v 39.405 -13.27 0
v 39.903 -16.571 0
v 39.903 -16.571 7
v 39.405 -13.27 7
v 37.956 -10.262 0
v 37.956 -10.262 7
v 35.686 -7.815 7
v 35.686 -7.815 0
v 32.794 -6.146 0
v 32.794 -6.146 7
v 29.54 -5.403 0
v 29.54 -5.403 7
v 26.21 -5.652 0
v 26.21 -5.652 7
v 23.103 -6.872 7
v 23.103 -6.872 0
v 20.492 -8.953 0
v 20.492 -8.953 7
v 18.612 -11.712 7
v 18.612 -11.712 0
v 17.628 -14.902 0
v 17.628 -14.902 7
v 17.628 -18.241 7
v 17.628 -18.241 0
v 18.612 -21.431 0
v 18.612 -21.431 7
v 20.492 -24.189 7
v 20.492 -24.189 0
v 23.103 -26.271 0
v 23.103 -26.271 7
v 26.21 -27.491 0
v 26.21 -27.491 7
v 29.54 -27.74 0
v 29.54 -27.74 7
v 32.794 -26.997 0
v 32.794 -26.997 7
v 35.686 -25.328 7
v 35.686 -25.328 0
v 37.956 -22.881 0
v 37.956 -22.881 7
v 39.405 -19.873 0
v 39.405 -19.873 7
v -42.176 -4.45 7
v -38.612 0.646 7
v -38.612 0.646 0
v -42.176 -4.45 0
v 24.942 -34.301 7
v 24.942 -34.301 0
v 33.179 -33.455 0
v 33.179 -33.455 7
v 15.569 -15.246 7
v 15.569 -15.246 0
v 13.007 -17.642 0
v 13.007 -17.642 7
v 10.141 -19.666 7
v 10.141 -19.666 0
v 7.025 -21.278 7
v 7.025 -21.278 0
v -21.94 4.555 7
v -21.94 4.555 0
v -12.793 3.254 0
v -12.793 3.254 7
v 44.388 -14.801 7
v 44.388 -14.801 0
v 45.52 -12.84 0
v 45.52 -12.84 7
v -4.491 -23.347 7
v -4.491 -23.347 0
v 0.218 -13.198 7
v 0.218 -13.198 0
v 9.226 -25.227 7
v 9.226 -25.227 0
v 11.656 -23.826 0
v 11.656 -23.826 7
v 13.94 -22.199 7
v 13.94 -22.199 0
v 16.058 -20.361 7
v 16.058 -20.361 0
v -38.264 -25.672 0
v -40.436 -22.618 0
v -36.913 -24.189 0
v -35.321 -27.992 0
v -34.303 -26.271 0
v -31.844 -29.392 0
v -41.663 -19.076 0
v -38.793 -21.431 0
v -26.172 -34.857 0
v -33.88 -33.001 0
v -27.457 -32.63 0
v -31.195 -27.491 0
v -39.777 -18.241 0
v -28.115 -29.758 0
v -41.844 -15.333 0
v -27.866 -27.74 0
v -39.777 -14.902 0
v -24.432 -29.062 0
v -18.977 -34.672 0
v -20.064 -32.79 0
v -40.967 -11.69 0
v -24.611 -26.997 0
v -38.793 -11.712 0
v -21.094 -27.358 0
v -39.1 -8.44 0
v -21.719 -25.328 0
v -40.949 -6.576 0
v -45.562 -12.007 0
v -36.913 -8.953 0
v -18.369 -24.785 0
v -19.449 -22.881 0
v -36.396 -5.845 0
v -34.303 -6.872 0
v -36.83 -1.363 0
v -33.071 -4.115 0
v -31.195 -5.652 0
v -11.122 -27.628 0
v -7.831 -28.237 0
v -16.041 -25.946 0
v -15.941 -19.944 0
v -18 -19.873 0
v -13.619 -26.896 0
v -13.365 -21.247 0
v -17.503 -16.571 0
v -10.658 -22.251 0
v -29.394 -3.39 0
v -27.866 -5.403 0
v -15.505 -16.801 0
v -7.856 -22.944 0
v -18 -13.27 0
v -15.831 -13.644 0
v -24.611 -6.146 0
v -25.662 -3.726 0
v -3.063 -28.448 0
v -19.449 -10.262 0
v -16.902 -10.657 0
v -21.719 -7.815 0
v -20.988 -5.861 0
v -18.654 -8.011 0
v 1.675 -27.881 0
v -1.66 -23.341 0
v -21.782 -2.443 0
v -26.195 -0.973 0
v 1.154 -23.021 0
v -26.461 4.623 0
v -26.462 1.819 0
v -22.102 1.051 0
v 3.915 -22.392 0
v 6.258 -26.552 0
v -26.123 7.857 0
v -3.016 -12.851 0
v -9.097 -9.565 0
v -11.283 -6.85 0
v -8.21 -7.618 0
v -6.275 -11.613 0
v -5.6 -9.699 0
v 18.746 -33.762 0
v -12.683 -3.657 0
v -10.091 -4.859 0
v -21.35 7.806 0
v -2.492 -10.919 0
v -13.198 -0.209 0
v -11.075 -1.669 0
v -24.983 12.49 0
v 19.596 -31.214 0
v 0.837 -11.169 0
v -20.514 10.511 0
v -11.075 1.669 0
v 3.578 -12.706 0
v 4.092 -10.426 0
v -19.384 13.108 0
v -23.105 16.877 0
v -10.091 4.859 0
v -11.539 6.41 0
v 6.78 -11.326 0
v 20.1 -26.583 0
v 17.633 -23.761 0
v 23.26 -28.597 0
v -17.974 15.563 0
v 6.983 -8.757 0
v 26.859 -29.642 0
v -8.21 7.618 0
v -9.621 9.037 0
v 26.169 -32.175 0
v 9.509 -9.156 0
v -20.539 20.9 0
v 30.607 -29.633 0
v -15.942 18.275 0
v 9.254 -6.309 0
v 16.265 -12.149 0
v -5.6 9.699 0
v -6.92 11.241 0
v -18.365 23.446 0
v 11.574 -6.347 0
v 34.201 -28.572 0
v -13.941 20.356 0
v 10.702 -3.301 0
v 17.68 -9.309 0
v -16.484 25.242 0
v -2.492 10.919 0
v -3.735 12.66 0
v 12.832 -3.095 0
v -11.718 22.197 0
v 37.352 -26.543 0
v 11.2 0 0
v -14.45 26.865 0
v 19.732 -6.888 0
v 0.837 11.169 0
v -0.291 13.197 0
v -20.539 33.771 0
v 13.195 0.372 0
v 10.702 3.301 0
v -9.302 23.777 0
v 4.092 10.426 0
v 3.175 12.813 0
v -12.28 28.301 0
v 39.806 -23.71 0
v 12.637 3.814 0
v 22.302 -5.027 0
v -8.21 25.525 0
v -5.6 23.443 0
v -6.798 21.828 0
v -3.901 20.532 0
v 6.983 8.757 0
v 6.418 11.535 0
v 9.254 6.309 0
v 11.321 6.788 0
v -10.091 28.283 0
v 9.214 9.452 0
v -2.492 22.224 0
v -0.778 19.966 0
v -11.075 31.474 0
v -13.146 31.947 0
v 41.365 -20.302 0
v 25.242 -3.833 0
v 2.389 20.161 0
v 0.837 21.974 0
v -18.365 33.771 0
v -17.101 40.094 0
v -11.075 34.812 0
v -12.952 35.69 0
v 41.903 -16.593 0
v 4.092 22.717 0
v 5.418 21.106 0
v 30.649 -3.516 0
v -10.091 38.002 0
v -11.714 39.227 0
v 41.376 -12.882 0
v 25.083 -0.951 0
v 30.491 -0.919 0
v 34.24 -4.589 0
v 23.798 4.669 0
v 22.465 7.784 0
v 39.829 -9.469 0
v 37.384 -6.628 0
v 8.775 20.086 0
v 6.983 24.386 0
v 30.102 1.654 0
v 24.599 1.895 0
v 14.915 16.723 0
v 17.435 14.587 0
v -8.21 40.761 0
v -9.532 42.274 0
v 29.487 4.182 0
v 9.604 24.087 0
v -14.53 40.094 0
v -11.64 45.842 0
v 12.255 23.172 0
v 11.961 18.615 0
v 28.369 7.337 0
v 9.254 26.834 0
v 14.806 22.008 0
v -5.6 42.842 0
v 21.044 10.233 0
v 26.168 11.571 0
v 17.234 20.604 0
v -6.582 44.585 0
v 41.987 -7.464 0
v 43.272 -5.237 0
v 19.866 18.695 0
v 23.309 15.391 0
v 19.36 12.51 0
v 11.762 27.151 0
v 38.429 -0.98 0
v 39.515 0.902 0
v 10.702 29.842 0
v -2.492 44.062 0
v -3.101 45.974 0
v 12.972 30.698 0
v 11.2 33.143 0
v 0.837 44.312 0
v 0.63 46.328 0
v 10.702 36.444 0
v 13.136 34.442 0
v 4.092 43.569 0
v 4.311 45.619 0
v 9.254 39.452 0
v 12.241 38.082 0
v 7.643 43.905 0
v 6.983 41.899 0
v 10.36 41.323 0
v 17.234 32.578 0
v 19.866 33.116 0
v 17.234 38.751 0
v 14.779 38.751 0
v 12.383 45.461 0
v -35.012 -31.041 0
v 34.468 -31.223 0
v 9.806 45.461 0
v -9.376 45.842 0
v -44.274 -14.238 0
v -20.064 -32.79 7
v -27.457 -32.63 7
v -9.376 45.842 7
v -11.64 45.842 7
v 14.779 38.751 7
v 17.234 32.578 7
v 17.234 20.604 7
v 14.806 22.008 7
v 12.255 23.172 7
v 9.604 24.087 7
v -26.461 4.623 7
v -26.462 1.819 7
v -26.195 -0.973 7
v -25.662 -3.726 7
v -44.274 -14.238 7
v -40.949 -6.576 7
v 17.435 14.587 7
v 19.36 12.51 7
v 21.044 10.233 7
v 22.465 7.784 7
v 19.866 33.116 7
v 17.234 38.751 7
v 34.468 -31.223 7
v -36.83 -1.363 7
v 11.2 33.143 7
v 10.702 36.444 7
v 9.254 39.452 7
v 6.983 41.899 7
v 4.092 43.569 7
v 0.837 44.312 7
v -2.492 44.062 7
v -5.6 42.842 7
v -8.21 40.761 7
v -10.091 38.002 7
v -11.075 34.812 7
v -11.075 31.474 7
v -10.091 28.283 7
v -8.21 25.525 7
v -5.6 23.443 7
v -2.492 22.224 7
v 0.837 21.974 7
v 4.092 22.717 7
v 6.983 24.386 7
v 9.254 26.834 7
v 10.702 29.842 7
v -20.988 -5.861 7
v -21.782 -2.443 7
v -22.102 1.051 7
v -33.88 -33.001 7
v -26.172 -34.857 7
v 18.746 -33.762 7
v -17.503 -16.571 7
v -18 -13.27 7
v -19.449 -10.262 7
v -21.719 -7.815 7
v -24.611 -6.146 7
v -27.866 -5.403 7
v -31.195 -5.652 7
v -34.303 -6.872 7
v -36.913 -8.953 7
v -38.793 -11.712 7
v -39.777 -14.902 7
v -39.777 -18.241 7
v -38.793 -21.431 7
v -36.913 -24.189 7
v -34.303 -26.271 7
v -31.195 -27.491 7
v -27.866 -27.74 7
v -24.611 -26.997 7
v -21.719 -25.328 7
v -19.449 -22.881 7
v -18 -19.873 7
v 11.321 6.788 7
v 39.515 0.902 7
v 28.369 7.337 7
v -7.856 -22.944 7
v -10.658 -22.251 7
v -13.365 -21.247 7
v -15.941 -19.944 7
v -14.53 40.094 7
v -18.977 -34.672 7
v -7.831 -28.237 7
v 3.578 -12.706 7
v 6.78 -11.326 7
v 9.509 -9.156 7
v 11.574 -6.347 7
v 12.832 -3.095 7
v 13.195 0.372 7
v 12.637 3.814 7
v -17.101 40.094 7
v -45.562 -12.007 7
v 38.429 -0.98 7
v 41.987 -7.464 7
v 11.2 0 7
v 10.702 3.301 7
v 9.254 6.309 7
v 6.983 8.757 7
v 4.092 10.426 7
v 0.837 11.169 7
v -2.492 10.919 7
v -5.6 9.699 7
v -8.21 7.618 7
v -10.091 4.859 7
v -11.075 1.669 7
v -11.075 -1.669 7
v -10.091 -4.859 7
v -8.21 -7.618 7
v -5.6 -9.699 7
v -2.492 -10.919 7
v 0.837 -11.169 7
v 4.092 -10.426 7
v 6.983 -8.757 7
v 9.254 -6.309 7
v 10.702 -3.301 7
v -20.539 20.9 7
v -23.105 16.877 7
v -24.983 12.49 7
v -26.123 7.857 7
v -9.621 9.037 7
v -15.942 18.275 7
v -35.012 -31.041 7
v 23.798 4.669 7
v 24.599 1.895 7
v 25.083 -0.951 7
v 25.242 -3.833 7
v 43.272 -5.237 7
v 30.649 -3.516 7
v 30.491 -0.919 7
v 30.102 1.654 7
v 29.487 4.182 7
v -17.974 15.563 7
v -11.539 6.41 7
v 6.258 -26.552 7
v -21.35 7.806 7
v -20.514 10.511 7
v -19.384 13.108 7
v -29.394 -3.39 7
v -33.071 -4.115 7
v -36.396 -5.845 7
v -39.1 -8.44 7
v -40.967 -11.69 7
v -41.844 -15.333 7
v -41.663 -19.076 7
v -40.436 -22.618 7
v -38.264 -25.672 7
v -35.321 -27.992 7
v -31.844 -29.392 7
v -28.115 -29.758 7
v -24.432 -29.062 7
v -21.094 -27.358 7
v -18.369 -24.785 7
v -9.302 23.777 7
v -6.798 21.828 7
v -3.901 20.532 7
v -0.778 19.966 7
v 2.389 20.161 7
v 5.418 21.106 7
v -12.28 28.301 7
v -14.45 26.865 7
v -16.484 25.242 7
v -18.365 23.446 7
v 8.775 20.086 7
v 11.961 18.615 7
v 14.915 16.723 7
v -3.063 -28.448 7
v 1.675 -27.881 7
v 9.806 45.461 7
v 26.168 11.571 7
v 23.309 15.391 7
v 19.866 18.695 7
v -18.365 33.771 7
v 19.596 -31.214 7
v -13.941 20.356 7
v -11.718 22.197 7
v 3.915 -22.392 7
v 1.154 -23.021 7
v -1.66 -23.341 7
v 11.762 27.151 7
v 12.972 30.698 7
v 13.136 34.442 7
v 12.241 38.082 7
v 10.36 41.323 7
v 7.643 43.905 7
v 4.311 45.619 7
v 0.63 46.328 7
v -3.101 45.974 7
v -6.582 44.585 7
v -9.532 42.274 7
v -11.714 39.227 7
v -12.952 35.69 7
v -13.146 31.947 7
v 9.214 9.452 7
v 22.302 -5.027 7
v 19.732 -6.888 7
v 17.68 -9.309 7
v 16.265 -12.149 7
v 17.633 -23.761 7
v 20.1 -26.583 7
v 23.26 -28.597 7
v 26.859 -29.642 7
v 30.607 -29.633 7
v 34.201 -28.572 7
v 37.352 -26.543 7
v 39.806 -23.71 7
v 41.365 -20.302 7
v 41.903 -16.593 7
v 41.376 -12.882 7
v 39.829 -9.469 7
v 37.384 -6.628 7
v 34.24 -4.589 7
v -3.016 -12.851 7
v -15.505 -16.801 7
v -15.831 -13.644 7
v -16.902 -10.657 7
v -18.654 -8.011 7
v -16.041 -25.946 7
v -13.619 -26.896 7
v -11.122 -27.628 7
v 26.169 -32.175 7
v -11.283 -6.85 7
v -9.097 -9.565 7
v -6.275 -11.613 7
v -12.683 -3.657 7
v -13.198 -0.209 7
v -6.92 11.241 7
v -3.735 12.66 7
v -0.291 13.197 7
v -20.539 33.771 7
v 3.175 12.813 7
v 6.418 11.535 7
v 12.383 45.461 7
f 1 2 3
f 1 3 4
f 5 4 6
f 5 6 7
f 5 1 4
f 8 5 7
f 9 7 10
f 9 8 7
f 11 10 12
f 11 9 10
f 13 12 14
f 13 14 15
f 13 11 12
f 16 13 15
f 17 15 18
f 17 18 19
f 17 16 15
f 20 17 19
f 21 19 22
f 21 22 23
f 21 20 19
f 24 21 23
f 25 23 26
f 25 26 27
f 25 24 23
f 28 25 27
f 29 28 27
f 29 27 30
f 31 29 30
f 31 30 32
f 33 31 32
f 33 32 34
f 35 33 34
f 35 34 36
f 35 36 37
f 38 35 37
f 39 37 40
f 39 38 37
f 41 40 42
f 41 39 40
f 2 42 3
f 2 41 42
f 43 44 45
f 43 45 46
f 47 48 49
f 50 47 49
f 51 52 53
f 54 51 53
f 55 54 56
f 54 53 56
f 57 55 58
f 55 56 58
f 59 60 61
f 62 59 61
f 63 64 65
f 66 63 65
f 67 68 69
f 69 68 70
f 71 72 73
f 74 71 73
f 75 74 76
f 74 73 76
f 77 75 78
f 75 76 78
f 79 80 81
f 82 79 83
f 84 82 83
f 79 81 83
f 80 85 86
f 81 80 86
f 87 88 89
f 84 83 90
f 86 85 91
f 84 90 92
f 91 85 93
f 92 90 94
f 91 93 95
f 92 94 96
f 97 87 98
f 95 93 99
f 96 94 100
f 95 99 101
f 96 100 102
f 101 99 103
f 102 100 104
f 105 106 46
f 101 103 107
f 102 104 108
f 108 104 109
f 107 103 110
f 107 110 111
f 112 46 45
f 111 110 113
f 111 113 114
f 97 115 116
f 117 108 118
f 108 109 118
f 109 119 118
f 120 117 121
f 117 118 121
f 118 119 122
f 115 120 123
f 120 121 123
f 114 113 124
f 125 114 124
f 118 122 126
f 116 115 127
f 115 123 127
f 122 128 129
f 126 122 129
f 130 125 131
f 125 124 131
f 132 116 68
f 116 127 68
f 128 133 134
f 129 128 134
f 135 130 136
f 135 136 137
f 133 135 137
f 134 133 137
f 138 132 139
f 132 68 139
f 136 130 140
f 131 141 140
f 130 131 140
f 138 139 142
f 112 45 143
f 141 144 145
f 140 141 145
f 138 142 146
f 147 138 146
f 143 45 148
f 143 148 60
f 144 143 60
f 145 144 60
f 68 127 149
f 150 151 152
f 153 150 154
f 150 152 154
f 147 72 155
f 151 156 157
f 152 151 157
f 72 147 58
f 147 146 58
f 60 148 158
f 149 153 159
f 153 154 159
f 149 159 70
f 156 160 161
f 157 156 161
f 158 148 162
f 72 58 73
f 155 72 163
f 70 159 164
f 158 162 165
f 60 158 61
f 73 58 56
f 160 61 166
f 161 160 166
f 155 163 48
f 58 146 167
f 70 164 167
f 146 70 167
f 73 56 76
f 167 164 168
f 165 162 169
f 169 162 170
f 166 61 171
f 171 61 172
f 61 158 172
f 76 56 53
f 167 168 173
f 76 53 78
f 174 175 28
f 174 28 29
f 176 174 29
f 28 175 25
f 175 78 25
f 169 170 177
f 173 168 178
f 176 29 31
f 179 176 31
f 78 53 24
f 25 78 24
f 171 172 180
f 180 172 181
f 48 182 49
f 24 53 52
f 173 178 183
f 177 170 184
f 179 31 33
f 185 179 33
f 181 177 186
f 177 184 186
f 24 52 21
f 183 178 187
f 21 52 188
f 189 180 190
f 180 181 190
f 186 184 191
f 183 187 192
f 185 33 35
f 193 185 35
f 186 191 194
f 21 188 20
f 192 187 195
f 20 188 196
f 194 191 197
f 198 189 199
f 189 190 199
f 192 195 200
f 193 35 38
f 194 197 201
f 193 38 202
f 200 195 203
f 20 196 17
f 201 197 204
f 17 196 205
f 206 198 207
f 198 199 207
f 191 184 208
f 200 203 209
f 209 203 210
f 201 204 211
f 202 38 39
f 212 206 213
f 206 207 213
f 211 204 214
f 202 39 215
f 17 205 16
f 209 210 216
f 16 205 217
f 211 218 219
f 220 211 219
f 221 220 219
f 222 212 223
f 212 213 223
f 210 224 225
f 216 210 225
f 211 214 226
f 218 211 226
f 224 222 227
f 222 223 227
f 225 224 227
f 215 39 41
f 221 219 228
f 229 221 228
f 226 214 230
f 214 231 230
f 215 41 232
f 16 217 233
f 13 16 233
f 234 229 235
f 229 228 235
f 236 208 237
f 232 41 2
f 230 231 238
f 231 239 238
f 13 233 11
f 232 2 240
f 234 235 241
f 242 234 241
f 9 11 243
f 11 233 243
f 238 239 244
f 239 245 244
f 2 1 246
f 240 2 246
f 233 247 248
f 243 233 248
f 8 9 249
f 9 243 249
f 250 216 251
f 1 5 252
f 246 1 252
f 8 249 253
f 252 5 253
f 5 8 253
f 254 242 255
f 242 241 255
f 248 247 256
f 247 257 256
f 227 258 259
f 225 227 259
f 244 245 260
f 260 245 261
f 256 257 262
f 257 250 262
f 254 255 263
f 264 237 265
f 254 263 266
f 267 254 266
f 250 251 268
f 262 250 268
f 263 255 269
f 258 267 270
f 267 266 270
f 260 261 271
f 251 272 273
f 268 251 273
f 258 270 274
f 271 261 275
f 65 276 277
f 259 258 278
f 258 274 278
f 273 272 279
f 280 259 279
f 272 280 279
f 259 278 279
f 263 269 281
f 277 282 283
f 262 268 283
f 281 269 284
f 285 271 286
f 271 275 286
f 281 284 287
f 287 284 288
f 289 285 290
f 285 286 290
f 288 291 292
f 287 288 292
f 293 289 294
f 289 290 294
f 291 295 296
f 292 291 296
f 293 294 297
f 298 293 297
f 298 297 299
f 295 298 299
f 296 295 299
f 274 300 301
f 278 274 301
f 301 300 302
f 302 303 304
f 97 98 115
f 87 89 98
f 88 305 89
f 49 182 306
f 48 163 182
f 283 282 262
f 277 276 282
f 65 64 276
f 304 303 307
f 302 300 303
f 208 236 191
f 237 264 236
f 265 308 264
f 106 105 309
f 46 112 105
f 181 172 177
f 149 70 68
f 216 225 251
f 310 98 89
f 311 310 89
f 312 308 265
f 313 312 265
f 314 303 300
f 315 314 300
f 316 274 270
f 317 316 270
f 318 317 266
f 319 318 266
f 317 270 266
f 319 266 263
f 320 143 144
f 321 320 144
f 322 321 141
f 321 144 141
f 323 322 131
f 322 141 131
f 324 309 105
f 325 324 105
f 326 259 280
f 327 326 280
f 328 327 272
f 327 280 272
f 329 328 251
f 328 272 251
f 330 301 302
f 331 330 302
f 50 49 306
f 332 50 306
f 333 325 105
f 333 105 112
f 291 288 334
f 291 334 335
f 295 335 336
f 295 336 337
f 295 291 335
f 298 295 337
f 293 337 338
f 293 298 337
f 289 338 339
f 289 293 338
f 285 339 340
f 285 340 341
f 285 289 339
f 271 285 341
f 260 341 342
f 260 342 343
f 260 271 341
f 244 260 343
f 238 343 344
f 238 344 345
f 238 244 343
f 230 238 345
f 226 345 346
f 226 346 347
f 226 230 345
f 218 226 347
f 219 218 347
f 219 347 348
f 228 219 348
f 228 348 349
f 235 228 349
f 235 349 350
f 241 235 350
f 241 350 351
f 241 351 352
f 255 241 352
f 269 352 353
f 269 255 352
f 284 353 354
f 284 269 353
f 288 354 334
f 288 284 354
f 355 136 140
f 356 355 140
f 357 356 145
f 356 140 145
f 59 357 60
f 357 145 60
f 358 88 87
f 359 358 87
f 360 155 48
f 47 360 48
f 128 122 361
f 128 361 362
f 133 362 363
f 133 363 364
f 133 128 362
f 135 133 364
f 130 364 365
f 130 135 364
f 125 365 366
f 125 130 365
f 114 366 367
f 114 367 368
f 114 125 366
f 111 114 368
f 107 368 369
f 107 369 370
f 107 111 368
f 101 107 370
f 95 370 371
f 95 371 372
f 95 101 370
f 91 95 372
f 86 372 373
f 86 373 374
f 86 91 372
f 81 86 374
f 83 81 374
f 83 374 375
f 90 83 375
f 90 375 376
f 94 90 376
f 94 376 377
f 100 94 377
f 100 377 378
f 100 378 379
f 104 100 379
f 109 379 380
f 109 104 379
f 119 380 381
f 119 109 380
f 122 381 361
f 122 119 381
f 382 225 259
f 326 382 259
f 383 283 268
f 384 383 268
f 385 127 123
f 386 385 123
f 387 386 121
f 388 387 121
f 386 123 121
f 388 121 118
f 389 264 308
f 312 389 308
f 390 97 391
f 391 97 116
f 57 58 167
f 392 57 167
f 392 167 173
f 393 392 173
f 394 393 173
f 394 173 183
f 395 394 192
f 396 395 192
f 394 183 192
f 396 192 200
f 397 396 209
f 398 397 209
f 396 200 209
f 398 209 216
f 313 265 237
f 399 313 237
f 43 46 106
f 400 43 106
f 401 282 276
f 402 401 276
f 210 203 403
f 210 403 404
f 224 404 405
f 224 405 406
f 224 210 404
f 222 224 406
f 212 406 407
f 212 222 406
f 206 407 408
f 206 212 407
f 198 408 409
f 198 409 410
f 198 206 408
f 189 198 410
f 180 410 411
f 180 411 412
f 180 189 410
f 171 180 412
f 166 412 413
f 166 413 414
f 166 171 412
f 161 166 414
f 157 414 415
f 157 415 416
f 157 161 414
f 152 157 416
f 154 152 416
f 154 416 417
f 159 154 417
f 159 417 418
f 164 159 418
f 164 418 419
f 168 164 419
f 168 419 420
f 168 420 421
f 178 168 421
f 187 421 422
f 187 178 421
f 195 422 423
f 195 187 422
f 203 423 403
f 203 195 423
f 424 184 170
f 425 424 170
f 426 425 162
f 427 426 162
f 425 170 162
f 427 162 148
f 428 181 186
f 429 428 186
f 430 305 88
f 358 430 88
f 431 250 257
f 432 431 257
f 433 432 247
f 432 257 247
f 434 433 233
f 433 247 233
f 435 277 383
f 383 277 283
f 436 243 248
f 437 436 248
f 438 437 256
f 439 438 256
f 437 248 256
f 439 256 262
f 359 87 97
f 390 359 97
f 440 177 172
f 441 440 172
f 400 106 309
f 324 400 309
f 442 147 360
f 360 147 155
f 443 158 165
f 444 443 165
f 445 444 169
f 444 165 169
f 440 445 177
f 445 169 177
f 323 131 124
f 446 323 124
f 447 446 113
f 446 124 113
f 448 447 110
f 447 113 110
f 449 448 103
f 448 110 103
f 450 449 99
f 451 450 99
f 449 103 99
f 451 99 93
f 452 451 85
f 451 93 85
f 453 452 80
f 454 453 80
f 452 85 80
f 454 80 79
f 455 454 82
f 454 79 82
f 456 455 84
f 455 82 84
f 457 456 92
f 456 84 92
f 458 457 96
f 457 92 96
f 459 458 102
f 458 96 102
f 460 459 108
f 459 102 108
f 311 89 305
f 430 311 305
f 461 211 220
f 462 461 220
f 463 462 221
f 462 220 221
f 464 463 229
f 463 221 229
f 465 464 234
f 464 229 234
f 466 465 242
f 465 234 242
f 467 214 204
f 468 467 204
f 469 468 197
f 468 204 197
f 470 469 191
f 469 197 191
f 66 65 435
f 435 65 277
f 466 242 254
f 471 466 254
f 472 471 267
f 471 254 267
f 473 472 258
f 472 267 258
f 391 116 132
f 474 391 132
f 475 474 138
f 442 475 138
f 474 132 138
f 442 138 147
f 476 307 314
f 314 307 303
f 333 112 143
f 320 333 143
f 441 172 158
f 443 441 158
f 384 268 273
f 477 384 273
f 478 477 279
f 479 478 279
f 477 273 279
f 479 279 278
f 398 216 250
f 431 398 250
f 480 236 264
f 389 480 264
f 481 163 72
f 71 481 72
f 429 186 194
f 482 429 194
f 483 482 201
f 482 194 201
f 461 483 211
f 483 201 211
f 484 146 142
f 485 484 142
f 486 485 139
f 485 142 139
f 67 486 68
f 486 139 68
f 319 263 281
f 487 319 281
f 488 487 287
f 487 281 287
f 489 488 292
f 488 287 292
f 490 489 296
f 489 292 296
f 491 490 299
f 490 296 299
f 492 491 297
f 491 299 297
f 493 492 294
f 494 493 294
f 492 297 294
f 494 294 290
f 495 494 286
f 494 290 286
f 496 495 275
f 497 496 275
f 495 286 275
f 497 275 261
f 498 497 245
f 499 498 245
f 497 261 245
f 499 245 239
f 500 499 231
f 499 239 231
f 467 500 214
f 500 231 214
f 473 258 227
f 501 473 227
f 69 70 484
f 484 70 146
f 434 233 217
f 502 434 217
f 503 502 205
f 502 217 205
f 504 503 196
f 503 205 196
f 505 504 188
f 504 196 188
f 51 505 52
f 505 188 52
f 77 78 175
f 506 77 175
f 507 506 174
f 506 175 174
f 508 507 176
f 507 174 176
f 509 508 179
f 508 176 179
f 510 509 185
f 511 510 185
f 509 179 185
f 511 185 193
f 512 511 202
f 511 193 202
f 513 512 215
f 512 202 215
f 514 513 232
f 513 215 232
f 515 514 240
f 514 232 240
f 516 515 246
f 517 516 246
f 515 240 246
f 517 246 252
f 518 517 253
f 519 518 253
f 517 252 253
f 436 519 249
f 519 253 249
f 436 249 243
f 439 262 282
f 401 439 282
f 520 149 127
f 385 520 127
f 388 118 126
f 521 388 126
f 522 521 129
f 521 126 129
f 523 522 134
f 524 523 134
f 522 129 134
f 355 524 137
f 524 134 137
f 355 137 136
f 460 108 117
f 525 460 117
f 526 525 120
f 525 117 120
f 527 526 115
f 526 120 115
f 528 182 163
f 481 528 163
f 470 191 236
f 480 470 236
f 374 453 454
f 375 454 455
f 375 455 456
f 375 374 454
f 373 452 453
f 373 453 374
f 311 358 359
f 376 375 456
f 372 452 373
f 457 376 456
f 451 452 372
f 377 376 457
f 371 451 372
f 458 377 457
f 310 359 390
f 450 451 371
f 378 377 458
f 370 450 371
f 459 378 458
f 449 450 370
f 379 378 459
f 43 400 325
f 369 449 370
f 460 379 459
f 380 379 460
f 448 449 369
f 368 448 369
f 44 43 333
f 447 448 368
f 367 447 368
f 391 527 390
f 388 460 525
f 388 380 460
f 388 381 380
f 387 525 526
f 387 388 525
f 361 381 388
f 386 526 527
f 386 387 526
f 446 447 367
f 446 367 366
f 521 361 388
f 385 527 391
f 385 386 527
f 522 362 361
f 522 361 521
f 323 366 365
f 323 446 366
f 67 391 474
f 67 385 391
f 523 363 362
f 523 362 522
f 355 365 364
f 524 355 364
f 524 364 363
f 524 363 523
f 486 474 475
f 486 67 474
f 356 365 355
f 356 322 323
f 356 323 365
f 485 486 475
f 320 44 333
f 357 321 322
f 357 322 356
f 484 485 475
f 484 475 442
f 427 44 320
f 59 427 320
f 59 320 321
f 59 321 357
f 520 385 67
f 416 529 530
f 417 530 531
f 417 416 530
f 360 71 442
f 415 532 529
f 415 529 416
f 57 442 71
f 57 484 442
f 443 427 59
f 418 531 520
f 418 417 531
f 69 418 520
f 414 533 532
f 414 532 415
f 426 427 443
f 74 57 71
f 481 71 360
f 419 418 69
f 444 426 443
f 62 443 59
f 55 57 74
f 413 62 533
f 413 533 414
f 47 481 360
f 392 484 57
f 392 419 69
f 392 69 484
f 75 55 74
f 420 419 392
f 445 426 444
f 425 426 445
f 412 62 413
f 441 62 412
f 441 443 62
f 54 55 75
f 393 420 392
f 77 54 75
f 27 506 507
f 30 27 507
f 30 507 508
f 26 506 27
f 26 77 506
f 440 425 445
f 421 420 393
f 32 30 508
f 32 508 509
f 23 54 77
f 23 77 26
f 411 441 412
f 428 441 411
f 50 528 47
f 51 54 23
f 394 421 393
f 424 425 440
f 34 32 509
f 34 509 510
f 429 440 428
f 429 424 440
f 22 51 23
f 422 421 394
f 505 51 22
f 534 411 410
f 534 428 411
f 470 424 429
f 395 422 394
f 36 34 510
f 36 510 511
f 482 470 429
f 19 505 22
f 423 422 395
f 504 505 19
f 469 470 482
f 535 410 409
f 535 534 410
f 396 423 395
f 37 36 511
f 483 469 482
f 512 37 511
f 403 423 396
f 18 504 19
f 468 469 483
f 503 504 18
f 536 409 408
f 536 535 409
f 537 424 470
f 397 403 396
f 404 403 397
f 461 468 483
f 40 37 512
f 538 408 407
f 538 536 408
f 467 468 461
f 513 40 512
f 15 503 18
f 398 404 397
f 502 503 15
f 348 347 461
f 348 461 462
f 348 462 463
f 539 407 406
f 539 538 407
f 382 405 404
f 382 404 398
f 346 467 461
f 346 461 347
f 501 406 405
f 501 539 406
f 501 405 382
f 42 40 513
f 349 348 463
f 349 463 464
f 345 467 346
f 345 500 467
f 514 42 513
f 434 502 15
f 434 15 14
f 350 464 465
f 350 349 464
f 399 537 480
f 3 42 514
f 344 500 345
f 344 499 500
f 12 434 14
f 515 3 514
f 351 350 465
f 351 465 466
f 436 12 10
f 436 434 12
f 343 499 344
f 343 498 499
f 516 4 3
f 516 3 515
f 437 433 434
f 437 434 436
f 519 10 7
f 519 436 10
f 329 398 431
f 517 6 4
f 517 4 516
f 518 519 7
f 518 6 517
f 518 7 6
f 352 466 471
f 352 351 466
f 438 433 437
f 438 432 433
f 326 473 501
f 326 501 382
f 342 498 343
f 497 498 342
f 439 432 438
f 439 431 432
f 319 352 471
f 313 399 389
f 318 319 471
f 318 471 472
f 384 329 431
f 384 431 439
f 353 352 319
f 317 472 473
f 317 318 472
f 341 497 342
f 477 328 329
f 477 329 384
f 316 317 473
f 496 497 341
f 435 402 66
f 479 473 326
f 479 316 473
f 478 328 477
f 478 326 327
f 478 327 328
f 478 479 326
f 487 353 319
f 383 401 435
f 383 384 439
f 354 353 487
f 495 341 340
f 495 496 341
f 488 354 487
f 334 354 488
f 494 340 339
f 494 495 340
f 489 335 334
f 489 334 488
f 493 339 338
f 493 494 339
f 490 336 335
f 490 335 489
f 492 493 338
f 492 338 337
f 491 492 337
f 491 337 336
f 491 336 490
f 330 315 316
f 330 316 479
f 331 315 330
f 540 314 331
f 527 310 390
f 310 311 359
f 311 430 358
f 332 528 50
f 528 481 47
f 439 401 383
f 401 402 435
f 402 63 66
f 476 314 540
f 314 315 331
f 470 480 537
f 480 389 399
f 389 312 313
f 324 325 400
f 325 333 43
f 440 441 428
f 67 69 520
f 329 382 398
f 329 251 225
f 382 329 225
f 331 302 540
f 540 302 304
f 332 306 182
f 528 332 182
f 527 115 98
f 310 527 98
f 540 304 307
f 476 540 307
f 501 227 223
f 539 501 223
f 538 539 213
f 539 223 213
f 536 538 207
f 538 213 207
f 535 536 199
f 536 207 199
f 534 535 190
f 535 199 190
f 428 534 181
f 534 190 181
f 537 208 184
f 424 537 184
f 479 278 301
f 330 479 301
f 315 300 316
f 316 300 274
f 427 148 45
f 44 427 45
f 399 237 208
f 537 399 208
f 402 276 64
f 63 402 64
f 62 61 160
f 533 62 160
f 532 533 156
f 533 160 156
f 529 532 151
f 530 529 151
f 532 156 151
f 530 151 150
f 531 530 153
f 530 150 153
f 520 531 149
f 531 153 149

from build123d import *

# Parameters (mm, degrees)
F0_R     = 11.2
F1_DEPTH = 7


with BuildPart() as f1:
    # F0 (on Top) → F1 (new body)
    with BuildSketch(Plane.XY):
        with BuildLine():
            Line((-21.939748, 4.555207), (-12.792678, 3.253825))
            ThreePointArc((-12.792678, 3.253825), (-11.283485, -6.850034), (-3.015751, -12.850885))
            Line((-3.015751, -12.850885), (-7.8557, -22.943517))
            Line((-7.8557, -22.943517), (-9.711457, -26.813285))
            Line((-9.711457, -26.813285), (-11.121781, -27.627536))
            Line((-11.121781, -27.627536), (-20.063522, -32.790052))
            Line((-20.063522, -32.790052), (-27.45722, -32.629778))
            Line((-27.45722, -32.629778), (-35.012019, -31.040825))
            Line((-35.012019, -31.040825), (-33.880058, -33.001439))
            Line((-33.880058, -33.001439), (-26.171613, -34.856514))
            Line((-26.171613, -34.856514), (-18.97682, -34.672275))
            Line((-18.97682, -34.672275), (-7.830637, -28.237023))
            Line((-7.830637, -28.237023), (-6.368866, -27.393069))
            Line((-6.368866, -27.393069), (-4.491412, -23.347324))
            Line((-4.491412, -23.347324), (0.218357, -13.198194))
            Line((0.218357, -13.198194), (3.914865, -22.392298))
            Line((3.914865, -22.392298), (5.384581, -26.047835))
            Line((5.384581, -26.047835), (6.257514, -26.551823))
            Line((6.257514, -26.551823), (18.746148, -33.762139))
            Line((18.746148, -33.762139), (24.941822, -34.300735))
            Line((24.941822, -34.300735), (33.179322, -33.454726))
            Line((33.179322, -33.454726), (34.46769, -31.223206))
            Line((34.46769, -31.223206), (26.169356, -32.174584))
            Line((26.169356, -32.174584), (19.596018, -31.214334))
            Line((19.596018, -31.214334), (9.226481, -25.227478))
            Line((9.226481, -25.227478), (8.427354, -24.766103))
            Line((8.427354, -24.766103), (7.024949, -21.277983))
            Line((7.024949, -21.277983), (3.578444, -12.705697))
            ThreePointArc((3.578444, -12.705697), (11.574046, -6.346768), (12.637068, 3.813725))
            Line((12.637068, 3.813725), (23.797519, 4.668523))
            Line((23.797519, 4.668523), (28.076715, 4.996274))
            Line((28.076715, 4.996274), (29.487039, 4.182023))
            Line((29.487039, 4.182023), (38.428779, -0.980493))
            Line((38.428779, -0.980493), (41.986827, -7.46376))
            Line((41.986827, -7.46376), (44.388153, -14.800885))
            Line((44.388153, -14.800885), (45.520113, -12.840272))
            Line((45.520113, -12.840272), (43.272433, -5.237025))
            Line((43.272433, -5.237025), (39.515481, 0.901729))
            Line((39.515481, 0.901729), (28.369297, 7.336981))
            Line((28.369297, 7.336981), (26.907526, 8.180935))
            Line((26.907526, 8.180935), (22.465082, 7.783985))
            Line((22.465082, 7.783985), (11.320793, 6.788199))
            Line((11.320793, 6.788199), (17.434867, 14.586522))
            Line((17.434867, 14.586522), (19.865796, 17.687101))
            Line((19.865796, 17.687101), (19.865796, 18.695077))
            Line((19.865796, 18.695077), (19.865796, 33.11571))
            Line((19.865796, 33.11571), (17.234397, 38.750619))
            Line((17.234397, 38.750619), (12.382981, 45.461498))
            Line((12.382981, 45.461498), (9.806245, 45.461498))
            Line((9.806245, 45.461498), (14.77933, 38.750619))
            Line((14.77933, 38.750619), (17.234397, 32.577816))
            Line((17.234397, 32.577816), (17.234397, 20.604106))
            Line((17.234397, 20.604106), (17.234397, 19.681354))
            Line((17.234397, 19.681354), (14.9148, 16.722776))
            Line((14.9148, 16.722776), (9.214235, 9.451872))
            ThreePointArc((9.214235, 9.451872), (-0.290561, 13.196802), (-9.621317, 9.03716))
            Line((-9.621317, 9.03716), (-15.941819, 18.274994))
            Line((-15.941819, 18.274994), (-18.365257, 21.817012))
            Line((-18.365257, 21.817012), (-18.365257, 23.445513))
            Line((-18.365257, 23.445513), (-18.365257, 33.770546))
            Line((-18.365257, 33.770546), (-14.529607, 40.093539))
            Line((-14.529607, 40.093539), (-9.376134, 45.84171))
            Line((-9.376134, 45.84171), (-11.640055, 45.84171))
            Line((-11.640055, 45.84171), (-17.10082, 40.093539))
            Line((-17.10082, 40.093539), (-20.538661, 33.770546))
            Line((-20.538661, 33.770546), (-20.538661, 20.900042))
            Line((-20.538661, 20.900042), (-20.538661, 19.212134))
            Line((-20.538661, 19.212134), (-17.97367, 15.563339))
            Line((-17.97367, 15.563339), (-11.53915, 6.409994))
            Line((-11.53915, 6.409994), (-21.349732, 7.805776))
            Line((-21.349732, 7.805776), (-25.250377, 8.360733))
            Line((-25.250377, 8.360733), (-26.12331, 7.856745))
            Line((-26.12331, 7.856745), (-38.611944, 0.646429))
            Line((-38.611944, 0.646429), (-42.176219, -4.449884))
            Line((-42.176219, -4.449884), (-45.562303, -12.006773))
            Line((-45.562303, -12.006773), (-44.273935, -14.238292))
            Line((-44.273935, -14.238292), (-40.948685, -6.576035))
            Line((-40.948685, -6.576035), (-36.830415, -1.363483))
            Line((-36.830415, -1.363483), (-26.460878, 4.623372))
            Line((-26.460878, 4.623372), (-25.661751, 5.084748))
            Line((-25.661751, 5.084748), (-21.939748, 4.555207))
        make_face()
        Circle(F0_R, mode=Mode.SUBTRACT)
        with BuildLine():
            Line((-9.711457, -26.813285), (-7.8557, -22.943517))
            ThreePointArc((-7.8557, -22.943517), (-12.025565, -21.787106), (-15.940622, -19.943903))
            ThreePointArc((-15.940622, -19.943903), (-16.27639, -12.118209), (-20.987711, -5.860599))
            ThreePointArc((-20.987711, -5.860599), (-23.219885, -4.563891), (-25.661751, -3.726428))
            ThreePointArc((-25.661751, -3.726428), (-41.175768, -20.890944), (-18.369131, -24.78487))
            ThreePointArc((-18.369131, -24.78487), (-14.840432, -26.448342), (-11.121781, -27.627536))
            Line((-11.121781, -27.627536), (-9.711457, -26.813285))
        make_face()
        with Locations((-28.702531, -16.571414)):
            Circle(F0_R, mode=Mode.SUBTRACT)
        with BuildLine():
            Line((-6.368866, -27.393069), (-7.830637, -28.237023))
            ThreePointArc((-7.830637, -28.237023), (-0.682852, -28.261424), (6.257514, -26.551823))
            Line((6.257514, -26.551823), (5.384581, -26.047835))
            Line((5.384581, -26.047835), (3.914865, -22.392298))
            ThreePointArc((3.914865, -22.392298), (-0.248488, -23.220008), (-4.491412, -23.347324))
            Line((-4.491412, -23.347324), (-6.368866, -27.393069))
        make_face()
        with BuildLine():
            Line((8.427354, -24.766103), (9.226481, -25.227478))
            ThreePointArc((9.226481, -25.227478), (12.8176, -23.040102), (16.058057, -20.360514))
            ThreePointArc((16.058057, -20.360514), (38.679972, -25.213789), (30.648892, -3.515699))
            ThreePointArc((30.648892, -3.515699), (30.325152, 0.37198), (29.487039, 4.182023))
            Line((29.487039, 4.182023), (28.076715, 4.996274))
            Line((28.076715, 4.996274), (23.797519, 4.668523))
            ThreePointArc((23.797519, 4.668523), (24.88097, 0.479108), (25.242237, -3.833032))
            ThreePointArc((25.242237, -3.833032), (18.632872, -8.036663), (15.569283, -15.245592))
            ThreePointArc((15.569283, -15.245592), (11.608949, -18.703471), (7.024949, -21.277983))
            Line((7.024949, -21.277983), (8.427354, -24.766103))
        make_face()
        with Locations((28.702531, -16.571414)):
            Circle(F0_R, mode=Mode.SUBTRACT)
        with BuildLine():
            ThreePointArc((28.369297, 7.336981), (24.816537, 13.539344), (19.865796, 18.695077))
            Line((19.865796, 18.695077), (19.865796, 17.687101))
            Line((19.865796, 17.687101), (17.434867, 14.586522))
            ThreePointArc((17.434867, 14.586522), (20.233361, 11.394807), (22.465082, 7.783985))
            Line((22.465082, 7.783985), (26.907526, 8.180935))
            Line((26.907526, 8.180935), (28.369297, 7.336981))
        make_face()
        with BuildLine():
            ThreePointArc((-12.279761, 28.300569), (-15.48472, 26.076362), (-18.365257, 23.445513))
            Line((-18.365257, 23.445513), (-18.365257, 21.817012))
            Line((-18.365257, 21.817012), (-15.941819, 18.274994))
            ThreePointArc((-15.941819, 18.274994), (-12.855404, 21.307998), (-9.301616, 23.776935))
            ThreePointArc((-9.301616, 23.776935), (-2.356482, 20.154872), (5.418428, 21.10619))
            ThreePointArc((5.418428, 21.10619), (10.393206, 19.40538), (14.9148, 16.722776))
            Line((14.9148, 16.722776), (17.234397, 19.681354))
            Line((17.234397, 19.681354), (17.234397, 20.604106))
            ThreePointArc((17.234397, 20.604106), (13.544514, 22.620419), (9.603694, 24.086942))
            ThreePointArc((9.603694, 24.086942), (2.495796, 46.104733), (-12.279761, 28.300569))
        make_face()
        with Locations((0, 33.142827)):
            Circle(F0_R, mode=Mode.SUBTRACT)
        with BuildLine():
            ThreePointArc((-20.538661, 20.900042), (-24.133685, 14.722079), (-26.12331, 7.856745))
            Line((-26.12331, 7.856745), (-25.250377, 8.360733))
            Line((-25.250377, 8.360733), (-21.349732, 7.805776))
            ThreePointArc((-21.349732, 7.805776), (-19.984873, 11.825201), (-17.97367, 15.563339))
            Line((-17.97367, 15.563339), (-20.538661, 19.212134))
            Line((-20.538661, 19.212134), (-20.538661, 20.900042))
        make_face()
        with BuildLine():
            ThreePointArc((-20.987711, -5.860599), (-22.002156, -0.701909), (-21.939748, 4.555207))
            Line((-21.939748, 4.555207), (-25.661751, 5.084748))
            Line((-25.661751, 5.084748), (-26.460878, 4.623372))
            ThreePointArc((-26.460878, 4.623372), (-26.362114, 0.419684), (-25.661751, -3.726428))
            ThreePointArc((-25.661751, -3.726428), (-23.219885, -4.563891), (-20.987711, -5.860599))
        make_face()
    extrude(amount=F1_DEPTH)


solid = f1.part
